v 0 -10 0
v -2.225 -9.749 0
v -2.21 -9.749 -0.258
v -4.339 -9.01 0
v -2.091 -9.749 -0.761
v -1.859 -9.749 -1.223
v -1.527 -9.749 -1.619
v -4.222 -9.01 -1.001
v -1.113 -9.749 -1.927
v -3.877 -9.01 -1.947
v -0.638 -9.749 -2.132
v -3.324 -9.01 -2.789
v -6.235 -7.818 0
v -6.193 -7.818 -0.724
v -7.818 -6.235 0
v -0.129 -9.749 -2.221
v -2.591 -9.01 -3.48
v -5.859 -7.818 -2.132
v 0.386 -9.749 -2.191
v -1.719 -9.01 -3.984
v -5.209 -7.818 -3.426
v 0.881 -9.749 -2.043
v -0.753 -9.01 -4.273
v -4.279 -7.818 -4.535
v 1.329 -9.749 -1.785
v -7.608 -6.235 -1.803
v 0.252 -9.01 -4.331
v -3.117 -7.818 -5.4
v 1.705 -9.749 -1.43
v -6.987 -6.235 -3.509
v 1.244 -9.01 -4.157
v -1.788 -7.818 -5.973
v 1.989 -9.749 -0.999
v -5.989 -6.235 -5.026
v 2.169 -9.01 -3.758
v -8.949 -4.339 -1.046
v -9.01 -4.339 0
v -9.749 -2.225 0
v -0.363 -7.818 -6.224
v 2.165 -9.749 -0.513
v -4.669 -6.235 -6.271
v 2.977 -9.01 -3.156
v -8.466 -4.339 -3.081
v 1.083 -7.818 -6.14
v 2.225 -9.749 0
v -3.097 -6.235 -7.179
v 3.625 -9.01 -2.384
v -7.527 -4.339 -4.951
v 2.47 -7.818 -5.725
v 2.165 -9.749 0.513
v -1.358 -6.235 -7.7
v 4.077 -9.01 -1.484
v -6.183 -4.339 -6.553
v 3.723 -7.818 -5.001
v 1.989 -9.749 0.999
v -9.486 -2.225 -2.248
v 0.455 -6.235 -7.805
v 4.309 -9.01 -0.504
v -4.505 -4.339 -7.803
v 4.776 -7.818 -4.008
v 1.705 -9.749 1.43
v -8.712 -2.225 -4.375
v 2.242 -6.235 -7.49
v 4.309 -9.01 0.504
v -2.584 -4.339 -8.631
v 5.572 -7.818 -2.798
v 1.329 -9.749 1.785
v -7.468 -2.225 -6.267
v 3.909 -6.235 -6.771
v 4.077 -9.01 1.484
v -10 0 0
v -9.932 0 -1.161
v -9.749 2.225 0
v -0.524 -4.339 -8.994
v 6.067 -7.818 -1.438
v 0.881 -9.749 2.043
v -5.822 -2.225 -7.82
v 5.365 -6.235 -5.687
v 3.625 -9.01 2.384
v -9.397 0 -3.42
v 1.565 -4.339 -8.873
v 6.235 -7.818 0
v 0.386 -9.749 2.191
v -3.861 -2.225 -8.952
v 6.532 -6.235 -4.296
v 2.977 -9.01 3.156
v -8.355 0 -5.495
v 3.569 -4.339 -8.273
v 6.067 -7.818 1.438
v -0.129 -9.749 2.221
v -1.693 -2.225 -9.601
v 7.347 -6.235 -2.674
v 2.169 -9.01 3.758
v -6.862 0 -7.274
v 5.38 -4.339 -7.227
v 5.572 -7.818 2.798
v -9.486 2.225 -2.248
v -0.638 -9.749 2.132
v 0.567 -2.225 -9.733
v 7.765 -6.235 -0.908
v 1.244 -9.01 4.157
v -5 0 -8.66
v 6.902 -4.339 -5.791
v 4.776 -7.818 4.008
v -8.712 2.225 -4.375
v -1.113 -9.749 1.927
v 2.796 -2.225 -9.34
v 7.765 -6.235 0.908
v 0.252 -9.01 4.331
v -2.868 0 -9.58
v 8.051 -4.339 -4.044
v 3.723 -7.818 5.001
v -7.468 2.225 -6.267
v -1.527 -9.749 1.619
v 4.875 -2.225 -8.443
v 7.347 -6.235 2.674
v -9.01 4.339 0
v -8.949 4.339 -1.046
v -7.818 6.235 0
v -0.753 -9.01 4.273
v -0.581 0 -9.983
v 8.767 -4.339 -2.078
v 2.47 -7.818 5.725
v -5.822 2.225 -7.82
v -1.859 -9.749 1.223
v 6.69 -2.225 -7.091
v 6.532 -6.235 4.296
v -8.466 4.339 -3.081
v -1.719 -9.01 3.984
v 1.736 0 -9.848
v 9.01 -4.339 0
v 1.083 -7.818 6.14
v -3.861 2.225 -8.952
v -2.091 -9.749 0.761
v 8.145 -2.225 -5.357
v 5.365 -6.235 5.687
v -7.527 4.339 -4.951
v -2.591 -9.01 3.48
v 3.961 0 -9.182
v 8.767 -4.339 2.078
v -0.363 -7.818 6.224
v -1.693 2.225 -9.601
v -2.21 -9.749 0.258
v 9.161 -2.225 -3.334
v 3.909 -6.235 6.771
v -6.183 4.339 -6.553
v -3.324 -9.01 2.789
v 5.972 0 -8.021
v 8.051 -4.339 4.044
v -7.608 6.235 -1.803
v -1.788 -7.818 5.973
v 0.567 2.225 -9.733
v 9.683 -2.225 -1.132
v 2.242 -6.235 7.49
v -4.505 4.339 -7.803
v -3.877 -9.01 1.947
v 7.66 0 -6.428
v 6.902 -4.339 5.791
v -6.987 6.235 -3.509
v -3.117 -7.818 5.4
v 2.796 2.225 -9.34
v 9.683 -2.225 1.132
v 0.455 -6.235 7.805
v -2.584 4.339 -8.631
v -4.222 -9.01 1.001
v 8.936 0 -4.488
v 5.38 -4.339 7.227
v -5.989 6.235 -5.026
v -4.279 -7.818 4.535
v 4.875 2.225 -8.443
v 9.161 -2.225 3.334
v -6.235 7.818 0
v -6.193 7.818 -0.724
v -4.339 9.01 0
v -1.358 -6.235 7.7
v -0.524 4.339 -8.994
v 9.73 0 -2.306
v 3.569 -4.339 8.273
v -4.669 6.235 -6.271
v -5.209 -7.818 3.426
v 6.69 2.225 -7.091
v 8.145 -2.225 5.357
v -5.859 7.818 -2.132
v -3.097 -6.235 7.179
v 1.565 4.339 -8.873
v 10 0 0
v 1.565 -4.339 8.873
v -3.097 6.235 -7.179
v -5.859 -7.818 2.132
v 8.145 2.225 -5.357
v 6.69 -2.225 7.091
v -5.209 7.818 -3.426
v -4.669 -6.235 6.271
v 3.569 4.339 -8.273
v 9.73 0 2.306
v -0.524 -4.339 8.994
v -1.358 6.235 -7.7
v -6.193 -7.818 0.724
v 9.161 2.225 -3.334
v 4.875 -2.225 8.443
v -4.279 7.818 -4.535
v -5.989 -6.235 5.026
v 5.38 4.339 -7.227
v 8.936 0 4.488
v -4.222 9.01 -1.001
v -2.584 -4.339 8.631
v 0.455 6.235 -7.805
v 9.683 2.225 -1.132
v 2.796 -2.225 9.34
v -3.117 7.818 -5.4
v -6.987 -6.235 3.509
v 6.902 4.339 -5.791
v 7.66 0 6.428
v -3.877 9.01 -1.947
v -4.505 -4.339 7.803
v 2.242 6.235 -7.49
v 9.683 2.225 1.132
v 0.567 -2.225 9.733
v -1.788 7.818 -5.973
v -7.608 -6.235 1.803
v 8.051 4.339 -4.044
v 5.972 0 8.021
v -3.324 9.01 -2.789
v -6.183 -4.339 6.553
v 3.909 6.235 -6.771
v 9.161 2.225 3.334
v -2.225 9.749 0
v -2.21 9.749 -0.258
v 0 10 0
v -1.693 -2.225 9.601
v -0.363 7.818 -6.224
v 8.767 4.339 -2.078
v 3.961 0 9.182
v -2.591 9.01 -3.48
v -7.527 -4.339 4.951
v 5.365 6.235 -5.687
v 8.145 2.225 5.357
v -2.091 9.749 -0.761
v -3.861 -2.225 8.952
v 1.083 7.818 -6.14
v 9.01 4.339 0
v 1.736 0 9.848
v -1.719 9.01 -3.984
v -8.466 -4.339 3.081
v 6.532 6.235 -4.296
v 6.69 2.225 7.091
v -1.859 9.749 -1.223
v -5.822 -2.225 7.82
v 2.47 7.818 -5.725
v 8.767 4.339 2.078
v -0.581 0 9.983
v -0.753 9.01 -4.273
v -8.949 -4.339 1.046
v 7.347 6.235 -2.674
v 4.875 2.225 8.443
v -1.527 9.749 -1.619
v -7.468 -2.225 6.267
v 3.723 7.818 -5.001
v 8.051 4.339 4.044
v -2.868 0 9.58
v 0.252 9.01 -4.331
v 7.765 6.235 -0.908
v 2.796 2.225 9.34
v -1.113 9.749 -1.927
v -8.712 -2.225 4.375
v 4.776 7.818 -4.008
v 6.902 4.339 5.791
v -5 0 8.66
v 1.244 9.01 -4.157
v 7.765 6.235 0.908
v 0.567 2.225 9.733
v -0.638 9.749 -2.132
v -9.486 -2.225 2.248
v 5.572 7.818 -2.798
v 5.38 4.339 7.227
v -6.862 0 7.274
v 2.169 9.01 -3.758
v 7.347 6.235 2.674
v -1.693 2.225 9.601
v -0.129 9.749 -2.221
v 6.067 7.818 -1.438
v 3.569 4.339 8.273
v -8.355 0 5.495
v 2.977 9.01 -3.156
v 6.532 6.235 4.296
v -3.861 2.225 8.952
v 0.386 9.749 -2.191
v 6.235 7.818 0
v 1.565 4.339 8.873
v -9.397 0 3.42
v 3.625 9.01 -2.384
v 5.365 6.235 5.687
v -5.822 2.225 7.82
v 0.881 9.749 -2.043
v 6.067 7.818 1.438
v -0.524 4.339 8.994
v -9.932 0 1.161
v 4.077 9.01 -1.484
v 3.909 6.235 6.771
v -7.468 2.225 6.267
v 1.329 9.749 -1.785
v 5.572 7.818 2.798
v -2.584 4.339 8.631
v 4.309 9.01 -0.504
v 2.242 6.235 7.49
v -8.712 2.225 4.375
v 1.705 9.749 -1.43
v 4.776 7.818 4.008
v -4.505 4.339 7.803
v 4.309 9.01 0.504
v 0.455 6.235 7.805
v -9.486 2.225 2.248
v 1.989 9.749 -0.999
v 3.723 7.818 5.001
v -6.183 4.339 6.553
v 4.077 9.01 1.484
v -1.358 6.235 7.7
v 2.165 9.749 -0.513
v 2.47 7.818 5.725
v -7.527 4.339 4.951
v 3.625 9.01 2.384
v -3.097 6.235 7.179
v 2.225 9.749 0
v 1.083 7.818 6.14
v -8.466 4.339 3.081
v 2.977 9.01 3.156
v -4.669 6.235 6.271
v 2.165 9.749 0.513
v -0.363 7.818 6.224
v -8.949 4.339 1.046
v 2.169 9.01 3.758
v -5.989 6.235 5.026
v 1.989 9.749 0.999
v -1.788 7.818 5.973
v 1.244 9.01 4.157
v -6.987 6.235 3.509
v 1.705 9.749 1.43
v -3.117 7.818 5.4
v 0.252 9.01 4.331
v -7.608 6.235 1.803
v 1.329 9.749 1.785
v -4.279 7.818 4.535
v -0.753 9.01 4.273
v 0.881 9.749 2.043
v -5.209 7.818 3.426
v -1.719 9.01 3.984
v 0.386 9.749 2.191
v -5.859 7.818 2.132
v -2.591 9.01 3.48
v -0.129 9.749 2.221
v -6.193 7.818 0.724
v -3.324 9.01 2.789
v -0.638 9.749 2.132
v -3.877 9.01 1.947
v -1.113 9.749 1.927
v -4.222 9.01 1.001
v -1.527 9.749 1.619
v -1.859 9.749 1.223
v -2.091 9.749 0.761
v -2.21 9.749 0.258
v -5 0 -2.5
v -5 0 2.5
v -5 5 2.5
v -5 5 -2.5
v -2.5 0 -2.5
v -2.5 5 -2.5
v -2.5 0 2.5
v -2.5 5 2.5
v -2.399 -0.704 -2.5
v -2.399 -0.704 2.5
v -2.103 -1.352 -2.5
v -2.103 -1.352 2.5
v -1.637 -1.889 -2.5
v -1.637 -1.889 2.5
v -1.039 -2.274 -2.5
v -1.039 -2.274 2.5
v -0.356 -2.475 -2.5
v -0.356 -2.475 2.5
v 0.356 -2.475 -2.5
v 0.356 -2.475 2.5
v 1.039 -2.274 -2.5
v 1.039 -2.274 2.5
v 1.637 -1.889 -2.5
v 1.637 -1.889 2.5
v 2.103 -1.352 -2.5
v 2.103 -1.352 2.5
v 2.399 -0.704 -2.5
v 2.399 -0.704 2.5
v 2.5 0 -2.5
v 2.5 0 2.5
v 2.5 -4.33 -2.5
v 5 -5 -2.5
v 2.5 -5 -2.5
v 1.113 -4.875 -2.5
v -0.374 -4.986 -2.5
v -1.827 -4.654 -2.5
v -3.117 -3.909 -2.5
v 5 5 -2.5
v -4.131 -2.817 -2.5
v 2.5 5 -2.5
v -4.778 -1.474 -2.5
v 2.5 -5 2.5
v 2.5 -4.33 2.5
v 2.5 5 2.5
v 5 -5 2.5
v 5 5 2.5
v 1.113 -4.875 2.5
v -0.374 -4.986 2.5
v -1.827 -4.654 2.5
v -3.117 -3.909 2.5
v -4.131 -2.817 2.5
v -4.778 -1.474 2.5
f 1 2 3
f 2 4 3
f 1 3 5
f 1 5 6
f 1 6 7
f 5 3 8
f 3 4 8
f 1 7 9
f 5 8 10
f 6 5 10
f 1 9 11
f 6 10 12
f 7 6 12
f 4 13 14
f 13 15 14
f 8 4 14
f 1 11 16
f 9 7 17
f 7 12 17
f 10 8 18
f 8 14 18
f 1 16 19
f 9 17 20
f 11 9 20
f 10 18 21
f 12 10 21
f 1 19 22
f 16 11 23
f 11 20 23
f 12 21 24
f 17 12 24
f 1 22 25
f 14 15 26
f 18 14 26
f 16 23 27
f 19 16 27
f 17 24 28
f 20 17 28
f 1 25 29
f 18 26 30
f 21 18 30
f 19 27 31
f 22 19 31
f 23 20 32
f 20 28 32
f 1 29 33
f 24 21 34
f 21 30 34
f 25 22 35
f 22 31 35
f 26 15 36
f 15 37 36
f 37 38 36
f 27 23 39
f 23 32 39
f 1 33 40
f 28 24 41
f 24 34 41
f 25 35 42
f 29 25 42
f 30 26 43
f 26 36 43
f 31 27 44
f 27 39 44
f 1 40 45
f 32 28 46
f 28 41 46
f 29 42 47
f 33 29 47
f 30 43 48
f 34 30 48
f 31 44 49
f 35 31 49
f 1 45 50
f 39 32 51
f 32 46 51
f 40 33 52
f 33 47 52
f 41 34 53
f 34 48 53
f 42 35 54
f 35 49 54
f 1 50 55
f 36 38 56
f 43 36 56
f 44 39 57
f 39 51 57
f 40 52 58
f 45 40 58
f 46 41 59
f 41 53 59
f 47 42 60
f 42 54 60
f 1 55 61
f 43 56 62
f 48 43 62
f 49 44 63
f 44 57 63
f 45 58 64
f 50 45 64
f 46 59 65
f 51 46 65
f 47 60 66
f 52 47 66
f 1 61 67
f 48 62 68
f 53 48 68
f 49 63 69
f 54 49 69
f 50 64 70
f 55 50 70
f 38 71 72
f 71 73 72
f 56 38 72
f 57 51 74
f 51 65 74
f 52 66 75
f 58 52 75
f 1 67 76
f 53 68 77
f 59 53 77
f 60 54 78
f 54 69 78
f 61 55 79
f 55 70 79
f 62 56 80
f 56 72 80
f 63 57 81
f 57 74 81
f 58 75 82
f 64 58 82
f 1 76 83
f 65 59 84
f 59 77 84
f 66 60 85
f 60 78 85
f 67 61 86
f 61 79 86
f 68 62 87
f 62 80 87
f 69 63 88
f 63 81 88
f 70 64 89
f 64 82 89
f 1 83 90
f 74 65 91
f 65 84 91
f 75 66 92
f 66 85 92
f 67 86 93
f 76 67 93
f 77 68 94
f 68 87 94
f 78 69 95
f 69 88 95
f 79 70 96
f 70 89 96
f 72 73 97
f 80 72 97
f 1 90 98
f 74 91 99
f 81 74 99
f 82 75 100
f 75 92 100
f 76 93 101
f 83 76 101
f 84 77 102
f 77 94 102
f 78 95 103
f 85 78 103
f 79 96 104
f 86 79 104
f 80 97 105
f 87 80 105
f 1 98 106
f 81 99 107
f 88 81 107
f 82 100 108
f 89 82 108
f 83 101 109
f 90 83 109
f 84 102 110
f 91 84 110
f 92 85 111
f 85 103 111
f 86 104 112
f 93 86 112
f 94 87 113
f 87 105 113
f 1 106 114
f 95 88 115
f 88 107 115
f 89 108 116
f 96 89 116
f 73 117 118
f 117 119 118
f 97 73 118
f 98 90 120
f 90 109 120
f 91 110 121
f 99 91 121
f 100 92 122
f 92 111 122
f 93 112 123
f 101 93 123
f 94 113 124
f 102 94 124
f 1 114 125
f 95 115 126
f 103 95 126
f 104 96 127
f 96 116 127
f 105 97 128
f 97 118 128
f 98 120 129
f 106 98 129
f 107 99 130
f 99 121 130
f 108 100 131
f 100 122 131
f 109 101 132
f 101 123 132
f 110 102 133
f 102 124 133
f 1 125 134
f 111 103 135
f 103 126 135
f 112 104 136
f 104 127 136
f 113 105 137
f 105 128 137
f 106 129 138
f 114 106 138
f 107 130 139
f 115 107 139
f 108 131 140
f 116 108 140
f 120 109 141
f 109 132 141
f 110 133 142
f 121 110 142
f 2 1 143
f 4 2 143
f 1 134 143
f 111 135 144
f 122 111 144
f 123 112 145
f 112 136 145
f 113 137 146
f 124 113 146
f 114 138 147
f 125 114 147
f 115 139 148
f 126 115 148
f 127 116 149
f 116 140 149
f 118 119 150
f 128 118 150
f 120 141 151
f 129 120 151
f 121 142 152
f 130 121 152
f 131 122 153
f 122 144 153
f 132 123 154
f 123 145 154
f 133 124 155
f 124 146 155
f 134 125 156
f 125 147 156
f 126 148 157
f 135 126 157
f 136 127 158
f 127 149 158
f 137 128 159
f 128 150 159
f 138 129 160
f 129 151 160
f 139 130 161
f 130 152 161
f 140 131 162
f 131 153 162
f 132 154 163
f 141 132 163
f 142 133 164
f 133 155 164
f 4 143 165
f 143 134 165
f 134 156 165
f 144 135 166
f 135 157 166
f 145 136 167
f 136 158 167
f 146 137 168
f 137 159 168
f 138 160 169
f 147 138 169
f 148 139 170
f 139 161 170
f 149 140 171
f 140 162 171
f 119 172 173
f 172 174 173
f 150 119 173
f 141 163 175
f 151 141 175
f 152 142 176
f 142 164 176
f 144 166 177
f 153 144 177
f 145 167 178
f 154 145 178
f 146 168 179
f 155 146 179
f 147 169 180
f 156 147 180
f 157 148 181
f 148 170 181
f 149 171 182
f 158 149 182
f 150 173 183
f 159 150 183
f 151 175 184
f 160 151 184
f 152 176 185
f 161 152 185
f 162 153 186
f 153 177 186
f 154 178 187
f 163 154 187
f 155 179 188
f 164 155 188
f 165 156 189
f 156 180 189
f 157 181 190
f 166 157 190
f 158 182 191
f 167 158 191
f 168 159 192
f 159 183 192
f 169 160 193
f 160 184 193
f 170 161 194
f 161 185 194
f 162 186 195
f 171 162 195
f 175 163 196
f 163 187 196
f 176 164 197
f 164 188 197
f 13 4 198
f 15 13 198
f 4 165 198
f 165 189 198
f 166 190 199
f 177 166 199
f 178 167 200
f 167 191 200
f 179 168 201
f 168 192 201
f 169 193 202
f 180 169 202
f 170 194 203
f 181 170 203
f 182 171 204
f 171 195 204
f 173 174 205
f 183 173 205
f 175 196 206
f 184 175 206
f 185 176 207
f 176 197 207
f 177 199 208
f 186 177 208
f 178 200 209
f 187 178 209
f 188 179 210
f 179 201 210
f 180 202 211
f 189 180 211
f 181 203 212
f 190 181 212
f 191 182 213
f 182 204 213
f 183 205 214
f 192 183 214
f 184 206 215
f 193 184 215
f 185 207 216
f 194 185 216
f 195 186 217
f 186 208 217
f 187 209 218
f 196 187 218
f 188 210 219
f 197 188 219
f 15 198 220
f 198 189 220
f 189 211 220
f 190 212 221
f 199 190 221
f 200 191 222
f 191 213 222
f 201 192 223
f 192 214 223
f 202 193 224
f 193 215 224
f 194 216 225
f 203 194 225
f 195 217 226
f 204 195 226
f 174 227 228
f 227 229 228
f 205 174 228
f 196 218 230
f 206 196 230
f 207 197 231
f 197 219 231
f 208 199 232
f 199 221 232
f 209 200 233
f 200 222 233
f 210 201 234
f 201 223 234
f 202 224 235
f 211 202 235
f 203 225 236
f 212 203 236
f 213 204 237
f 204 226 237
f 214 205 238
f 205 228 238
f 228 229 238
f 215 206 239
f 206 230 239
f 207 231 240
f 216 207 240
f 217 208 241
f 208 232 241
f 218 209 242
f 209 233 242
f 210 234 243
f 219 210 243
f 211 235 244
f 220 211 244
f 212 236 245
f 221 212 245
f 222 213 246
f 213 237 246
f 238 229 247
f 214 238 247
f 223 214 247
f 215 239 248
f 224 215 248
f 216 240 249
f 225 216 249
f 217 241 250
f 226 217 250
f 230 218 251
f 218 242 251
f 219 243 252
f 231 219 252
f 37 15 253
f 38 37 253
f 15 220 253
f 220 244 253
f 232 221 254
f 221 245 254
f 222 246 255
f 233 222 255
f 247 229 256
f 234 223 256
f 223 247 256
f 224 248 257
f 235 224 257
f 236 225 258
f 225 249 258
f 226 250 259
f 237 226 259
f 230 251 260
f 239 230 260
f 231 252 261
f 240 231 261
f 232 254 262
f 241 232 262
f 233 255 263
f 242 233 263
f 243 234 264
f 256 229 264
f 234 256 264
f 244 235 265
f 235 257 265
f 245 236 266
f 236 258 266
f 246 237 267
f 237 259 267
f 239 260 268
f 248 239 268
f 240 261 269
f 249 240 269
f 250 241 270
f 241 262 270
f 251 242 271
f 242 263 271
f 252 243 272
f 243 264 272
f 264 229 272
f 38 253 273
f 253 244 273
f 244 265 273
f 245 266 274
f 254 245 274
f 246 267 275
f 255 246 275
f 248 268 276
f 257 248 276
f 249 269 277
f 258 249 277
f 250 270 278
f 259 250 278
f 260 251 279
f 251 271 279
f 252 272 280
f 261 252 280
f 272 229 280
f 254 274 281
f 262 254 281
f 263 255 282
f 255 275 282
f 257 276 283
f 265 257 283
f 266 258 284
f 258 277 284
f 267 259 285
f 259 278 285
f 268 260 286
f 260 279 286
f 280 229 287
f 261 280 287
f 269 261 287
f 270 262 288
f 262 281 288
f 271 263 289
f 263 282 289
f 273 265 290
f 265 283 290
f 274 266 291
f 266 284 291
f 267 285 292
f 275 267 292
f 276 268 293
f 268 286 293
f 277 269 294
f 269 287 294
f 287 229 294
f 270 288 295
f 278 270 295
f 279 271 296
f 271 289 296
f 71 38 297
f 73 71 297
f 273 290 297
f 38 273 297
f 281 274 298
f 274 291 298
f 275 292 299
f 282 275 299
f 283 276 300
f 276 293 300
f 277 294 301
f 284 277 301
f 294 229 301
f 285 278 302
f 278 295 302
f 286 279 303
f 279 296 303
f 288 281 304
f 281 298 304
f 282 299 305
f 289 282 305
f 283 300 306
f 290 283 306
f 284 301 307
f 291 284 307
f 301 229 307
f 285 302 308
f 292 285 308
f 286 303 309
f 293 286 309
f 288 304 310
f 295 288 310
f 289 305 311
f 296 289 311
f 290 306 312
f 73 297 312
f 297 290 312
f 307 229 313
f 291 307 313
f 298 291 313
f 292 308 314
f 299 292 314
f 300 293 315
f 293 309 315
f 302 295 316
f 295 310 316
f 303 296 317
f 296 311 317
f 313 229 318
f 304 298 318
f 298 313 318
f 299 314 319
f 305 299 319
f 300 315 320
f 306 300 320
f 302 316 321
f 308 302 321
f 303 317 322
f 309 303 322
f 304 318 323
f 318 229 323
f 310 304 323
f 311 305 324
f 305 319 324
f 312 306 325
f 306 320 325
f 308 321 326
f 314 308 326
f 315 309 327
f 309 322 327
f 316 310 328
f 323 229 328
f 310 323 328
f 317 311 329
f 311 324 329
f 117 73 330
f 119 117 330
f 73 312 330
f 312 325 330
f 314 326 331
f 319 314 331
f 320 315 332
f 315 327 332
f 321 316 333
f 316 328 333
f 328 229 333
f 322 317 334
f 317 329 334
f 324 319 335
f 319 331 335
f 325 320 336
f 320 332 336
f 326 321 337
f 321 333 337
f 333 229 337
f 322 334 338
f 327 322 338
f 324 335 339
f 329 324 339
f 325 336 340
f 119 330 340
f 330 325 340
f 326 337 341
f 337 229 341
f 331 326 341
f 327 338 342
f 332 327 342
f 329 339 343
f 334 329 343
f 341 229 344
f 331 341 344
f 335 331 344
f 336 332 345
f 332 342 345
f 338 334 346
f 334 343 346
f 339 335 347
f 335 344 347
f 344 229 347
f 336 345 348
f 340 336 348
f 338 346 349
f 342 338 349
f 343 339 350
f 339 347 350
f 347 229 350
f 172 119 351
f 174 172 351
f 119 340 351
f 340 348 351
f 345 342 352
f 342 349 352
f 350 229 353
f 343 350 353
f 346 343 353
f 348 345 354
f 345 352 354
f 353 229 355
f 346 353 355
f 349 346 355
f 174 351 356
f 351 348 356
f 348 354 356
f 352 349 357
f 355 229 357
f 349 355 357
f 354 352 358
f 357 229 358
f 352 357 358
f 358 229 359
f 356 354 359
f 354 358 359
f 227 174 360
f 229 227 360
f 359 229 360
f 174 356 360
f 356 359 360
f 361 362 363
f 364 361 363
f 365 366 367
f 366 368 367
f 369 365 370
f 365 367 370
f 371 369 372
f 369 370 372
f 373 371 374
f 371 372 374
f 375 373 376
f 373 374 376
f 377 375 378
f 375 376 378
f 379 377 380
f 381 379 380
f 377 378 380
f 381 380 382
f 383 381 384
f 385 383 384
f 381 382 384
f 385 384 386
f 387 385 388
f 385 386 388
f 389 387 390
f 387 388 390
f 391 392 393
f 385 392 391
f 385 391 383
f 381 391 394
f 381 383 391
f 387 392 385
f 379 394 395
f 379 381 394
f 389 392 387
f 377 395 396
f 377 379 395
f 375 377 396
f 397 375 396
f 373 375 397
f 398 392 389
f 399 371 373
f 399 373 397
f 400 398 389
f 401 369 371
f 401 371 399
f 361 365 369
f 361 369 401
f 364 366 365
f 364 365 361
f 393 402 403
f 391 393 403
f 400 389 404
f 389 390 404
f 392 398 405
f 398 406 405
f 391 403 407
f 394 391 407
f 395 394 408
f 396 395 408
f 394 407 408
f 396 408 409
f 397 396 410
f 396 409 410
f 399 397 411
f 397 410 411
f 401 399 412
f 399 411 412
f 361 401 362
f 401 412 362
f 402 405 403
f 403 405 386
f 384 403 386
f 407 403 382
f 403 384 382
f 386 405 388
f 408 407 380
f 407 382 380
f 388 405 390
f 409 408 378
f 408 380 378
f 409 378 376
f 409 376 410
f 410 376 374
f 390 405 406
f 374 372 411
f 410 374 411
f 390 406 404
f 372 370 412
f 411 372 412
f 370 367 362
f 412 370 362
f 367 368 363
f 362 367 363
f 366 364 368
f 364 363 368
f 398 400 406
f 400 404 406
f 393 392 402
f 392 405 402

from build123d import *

# Parameters (mm, degrees)
AUFSATZ_LINEAR_AUSTRAGEN1_DEPTH = 2.5


with BuildPart() as part:
    # Skizze1 → Aufsatz-Linear austragen1 (new body, symmetric)
    with BuildSketch(Plane.XY):
        with BuildLine():
            Line((-5, 0), (-5, 5))
            Line((-5, 5), (-2.5, 5))
            Line((-2.5, 5), (-2.5, 0))
            ThreePointArc((-2.5, 0), (0, -2.5), (2.5, 0))
            Line((2.5, 0), (2.5, 5))
            Line((2.5, 5), (5, 5))
            Line((5, 5), (5, -5))
            Line((5, -5), (2.5, -5))
            Line((2.5, -5), (2.5, -4.330127019))
            ThreePointArc((2.5, -4.330127019), (-2.5, -4.330127019), (-5, 0))
        make_face()
    extrude(amount=AUFSATZ_LINEAR_AUSTRAGEN1_DEPTH, both=True)


with BuildPart() as body_2:
    # Skizze2 → Rotation1 (revolve)
    with BuildSketch(Plane.XY):
        with BuildLine():
            Line((0, 10), (0, -10))
            ThreePointArc((0, -10), (-10, 0), (0, 10))
        make_face()
    revolve(axis=Axis((0, 10, 0), (0, -1, 0)))


solid = Compound([part.part, body_2.part])
